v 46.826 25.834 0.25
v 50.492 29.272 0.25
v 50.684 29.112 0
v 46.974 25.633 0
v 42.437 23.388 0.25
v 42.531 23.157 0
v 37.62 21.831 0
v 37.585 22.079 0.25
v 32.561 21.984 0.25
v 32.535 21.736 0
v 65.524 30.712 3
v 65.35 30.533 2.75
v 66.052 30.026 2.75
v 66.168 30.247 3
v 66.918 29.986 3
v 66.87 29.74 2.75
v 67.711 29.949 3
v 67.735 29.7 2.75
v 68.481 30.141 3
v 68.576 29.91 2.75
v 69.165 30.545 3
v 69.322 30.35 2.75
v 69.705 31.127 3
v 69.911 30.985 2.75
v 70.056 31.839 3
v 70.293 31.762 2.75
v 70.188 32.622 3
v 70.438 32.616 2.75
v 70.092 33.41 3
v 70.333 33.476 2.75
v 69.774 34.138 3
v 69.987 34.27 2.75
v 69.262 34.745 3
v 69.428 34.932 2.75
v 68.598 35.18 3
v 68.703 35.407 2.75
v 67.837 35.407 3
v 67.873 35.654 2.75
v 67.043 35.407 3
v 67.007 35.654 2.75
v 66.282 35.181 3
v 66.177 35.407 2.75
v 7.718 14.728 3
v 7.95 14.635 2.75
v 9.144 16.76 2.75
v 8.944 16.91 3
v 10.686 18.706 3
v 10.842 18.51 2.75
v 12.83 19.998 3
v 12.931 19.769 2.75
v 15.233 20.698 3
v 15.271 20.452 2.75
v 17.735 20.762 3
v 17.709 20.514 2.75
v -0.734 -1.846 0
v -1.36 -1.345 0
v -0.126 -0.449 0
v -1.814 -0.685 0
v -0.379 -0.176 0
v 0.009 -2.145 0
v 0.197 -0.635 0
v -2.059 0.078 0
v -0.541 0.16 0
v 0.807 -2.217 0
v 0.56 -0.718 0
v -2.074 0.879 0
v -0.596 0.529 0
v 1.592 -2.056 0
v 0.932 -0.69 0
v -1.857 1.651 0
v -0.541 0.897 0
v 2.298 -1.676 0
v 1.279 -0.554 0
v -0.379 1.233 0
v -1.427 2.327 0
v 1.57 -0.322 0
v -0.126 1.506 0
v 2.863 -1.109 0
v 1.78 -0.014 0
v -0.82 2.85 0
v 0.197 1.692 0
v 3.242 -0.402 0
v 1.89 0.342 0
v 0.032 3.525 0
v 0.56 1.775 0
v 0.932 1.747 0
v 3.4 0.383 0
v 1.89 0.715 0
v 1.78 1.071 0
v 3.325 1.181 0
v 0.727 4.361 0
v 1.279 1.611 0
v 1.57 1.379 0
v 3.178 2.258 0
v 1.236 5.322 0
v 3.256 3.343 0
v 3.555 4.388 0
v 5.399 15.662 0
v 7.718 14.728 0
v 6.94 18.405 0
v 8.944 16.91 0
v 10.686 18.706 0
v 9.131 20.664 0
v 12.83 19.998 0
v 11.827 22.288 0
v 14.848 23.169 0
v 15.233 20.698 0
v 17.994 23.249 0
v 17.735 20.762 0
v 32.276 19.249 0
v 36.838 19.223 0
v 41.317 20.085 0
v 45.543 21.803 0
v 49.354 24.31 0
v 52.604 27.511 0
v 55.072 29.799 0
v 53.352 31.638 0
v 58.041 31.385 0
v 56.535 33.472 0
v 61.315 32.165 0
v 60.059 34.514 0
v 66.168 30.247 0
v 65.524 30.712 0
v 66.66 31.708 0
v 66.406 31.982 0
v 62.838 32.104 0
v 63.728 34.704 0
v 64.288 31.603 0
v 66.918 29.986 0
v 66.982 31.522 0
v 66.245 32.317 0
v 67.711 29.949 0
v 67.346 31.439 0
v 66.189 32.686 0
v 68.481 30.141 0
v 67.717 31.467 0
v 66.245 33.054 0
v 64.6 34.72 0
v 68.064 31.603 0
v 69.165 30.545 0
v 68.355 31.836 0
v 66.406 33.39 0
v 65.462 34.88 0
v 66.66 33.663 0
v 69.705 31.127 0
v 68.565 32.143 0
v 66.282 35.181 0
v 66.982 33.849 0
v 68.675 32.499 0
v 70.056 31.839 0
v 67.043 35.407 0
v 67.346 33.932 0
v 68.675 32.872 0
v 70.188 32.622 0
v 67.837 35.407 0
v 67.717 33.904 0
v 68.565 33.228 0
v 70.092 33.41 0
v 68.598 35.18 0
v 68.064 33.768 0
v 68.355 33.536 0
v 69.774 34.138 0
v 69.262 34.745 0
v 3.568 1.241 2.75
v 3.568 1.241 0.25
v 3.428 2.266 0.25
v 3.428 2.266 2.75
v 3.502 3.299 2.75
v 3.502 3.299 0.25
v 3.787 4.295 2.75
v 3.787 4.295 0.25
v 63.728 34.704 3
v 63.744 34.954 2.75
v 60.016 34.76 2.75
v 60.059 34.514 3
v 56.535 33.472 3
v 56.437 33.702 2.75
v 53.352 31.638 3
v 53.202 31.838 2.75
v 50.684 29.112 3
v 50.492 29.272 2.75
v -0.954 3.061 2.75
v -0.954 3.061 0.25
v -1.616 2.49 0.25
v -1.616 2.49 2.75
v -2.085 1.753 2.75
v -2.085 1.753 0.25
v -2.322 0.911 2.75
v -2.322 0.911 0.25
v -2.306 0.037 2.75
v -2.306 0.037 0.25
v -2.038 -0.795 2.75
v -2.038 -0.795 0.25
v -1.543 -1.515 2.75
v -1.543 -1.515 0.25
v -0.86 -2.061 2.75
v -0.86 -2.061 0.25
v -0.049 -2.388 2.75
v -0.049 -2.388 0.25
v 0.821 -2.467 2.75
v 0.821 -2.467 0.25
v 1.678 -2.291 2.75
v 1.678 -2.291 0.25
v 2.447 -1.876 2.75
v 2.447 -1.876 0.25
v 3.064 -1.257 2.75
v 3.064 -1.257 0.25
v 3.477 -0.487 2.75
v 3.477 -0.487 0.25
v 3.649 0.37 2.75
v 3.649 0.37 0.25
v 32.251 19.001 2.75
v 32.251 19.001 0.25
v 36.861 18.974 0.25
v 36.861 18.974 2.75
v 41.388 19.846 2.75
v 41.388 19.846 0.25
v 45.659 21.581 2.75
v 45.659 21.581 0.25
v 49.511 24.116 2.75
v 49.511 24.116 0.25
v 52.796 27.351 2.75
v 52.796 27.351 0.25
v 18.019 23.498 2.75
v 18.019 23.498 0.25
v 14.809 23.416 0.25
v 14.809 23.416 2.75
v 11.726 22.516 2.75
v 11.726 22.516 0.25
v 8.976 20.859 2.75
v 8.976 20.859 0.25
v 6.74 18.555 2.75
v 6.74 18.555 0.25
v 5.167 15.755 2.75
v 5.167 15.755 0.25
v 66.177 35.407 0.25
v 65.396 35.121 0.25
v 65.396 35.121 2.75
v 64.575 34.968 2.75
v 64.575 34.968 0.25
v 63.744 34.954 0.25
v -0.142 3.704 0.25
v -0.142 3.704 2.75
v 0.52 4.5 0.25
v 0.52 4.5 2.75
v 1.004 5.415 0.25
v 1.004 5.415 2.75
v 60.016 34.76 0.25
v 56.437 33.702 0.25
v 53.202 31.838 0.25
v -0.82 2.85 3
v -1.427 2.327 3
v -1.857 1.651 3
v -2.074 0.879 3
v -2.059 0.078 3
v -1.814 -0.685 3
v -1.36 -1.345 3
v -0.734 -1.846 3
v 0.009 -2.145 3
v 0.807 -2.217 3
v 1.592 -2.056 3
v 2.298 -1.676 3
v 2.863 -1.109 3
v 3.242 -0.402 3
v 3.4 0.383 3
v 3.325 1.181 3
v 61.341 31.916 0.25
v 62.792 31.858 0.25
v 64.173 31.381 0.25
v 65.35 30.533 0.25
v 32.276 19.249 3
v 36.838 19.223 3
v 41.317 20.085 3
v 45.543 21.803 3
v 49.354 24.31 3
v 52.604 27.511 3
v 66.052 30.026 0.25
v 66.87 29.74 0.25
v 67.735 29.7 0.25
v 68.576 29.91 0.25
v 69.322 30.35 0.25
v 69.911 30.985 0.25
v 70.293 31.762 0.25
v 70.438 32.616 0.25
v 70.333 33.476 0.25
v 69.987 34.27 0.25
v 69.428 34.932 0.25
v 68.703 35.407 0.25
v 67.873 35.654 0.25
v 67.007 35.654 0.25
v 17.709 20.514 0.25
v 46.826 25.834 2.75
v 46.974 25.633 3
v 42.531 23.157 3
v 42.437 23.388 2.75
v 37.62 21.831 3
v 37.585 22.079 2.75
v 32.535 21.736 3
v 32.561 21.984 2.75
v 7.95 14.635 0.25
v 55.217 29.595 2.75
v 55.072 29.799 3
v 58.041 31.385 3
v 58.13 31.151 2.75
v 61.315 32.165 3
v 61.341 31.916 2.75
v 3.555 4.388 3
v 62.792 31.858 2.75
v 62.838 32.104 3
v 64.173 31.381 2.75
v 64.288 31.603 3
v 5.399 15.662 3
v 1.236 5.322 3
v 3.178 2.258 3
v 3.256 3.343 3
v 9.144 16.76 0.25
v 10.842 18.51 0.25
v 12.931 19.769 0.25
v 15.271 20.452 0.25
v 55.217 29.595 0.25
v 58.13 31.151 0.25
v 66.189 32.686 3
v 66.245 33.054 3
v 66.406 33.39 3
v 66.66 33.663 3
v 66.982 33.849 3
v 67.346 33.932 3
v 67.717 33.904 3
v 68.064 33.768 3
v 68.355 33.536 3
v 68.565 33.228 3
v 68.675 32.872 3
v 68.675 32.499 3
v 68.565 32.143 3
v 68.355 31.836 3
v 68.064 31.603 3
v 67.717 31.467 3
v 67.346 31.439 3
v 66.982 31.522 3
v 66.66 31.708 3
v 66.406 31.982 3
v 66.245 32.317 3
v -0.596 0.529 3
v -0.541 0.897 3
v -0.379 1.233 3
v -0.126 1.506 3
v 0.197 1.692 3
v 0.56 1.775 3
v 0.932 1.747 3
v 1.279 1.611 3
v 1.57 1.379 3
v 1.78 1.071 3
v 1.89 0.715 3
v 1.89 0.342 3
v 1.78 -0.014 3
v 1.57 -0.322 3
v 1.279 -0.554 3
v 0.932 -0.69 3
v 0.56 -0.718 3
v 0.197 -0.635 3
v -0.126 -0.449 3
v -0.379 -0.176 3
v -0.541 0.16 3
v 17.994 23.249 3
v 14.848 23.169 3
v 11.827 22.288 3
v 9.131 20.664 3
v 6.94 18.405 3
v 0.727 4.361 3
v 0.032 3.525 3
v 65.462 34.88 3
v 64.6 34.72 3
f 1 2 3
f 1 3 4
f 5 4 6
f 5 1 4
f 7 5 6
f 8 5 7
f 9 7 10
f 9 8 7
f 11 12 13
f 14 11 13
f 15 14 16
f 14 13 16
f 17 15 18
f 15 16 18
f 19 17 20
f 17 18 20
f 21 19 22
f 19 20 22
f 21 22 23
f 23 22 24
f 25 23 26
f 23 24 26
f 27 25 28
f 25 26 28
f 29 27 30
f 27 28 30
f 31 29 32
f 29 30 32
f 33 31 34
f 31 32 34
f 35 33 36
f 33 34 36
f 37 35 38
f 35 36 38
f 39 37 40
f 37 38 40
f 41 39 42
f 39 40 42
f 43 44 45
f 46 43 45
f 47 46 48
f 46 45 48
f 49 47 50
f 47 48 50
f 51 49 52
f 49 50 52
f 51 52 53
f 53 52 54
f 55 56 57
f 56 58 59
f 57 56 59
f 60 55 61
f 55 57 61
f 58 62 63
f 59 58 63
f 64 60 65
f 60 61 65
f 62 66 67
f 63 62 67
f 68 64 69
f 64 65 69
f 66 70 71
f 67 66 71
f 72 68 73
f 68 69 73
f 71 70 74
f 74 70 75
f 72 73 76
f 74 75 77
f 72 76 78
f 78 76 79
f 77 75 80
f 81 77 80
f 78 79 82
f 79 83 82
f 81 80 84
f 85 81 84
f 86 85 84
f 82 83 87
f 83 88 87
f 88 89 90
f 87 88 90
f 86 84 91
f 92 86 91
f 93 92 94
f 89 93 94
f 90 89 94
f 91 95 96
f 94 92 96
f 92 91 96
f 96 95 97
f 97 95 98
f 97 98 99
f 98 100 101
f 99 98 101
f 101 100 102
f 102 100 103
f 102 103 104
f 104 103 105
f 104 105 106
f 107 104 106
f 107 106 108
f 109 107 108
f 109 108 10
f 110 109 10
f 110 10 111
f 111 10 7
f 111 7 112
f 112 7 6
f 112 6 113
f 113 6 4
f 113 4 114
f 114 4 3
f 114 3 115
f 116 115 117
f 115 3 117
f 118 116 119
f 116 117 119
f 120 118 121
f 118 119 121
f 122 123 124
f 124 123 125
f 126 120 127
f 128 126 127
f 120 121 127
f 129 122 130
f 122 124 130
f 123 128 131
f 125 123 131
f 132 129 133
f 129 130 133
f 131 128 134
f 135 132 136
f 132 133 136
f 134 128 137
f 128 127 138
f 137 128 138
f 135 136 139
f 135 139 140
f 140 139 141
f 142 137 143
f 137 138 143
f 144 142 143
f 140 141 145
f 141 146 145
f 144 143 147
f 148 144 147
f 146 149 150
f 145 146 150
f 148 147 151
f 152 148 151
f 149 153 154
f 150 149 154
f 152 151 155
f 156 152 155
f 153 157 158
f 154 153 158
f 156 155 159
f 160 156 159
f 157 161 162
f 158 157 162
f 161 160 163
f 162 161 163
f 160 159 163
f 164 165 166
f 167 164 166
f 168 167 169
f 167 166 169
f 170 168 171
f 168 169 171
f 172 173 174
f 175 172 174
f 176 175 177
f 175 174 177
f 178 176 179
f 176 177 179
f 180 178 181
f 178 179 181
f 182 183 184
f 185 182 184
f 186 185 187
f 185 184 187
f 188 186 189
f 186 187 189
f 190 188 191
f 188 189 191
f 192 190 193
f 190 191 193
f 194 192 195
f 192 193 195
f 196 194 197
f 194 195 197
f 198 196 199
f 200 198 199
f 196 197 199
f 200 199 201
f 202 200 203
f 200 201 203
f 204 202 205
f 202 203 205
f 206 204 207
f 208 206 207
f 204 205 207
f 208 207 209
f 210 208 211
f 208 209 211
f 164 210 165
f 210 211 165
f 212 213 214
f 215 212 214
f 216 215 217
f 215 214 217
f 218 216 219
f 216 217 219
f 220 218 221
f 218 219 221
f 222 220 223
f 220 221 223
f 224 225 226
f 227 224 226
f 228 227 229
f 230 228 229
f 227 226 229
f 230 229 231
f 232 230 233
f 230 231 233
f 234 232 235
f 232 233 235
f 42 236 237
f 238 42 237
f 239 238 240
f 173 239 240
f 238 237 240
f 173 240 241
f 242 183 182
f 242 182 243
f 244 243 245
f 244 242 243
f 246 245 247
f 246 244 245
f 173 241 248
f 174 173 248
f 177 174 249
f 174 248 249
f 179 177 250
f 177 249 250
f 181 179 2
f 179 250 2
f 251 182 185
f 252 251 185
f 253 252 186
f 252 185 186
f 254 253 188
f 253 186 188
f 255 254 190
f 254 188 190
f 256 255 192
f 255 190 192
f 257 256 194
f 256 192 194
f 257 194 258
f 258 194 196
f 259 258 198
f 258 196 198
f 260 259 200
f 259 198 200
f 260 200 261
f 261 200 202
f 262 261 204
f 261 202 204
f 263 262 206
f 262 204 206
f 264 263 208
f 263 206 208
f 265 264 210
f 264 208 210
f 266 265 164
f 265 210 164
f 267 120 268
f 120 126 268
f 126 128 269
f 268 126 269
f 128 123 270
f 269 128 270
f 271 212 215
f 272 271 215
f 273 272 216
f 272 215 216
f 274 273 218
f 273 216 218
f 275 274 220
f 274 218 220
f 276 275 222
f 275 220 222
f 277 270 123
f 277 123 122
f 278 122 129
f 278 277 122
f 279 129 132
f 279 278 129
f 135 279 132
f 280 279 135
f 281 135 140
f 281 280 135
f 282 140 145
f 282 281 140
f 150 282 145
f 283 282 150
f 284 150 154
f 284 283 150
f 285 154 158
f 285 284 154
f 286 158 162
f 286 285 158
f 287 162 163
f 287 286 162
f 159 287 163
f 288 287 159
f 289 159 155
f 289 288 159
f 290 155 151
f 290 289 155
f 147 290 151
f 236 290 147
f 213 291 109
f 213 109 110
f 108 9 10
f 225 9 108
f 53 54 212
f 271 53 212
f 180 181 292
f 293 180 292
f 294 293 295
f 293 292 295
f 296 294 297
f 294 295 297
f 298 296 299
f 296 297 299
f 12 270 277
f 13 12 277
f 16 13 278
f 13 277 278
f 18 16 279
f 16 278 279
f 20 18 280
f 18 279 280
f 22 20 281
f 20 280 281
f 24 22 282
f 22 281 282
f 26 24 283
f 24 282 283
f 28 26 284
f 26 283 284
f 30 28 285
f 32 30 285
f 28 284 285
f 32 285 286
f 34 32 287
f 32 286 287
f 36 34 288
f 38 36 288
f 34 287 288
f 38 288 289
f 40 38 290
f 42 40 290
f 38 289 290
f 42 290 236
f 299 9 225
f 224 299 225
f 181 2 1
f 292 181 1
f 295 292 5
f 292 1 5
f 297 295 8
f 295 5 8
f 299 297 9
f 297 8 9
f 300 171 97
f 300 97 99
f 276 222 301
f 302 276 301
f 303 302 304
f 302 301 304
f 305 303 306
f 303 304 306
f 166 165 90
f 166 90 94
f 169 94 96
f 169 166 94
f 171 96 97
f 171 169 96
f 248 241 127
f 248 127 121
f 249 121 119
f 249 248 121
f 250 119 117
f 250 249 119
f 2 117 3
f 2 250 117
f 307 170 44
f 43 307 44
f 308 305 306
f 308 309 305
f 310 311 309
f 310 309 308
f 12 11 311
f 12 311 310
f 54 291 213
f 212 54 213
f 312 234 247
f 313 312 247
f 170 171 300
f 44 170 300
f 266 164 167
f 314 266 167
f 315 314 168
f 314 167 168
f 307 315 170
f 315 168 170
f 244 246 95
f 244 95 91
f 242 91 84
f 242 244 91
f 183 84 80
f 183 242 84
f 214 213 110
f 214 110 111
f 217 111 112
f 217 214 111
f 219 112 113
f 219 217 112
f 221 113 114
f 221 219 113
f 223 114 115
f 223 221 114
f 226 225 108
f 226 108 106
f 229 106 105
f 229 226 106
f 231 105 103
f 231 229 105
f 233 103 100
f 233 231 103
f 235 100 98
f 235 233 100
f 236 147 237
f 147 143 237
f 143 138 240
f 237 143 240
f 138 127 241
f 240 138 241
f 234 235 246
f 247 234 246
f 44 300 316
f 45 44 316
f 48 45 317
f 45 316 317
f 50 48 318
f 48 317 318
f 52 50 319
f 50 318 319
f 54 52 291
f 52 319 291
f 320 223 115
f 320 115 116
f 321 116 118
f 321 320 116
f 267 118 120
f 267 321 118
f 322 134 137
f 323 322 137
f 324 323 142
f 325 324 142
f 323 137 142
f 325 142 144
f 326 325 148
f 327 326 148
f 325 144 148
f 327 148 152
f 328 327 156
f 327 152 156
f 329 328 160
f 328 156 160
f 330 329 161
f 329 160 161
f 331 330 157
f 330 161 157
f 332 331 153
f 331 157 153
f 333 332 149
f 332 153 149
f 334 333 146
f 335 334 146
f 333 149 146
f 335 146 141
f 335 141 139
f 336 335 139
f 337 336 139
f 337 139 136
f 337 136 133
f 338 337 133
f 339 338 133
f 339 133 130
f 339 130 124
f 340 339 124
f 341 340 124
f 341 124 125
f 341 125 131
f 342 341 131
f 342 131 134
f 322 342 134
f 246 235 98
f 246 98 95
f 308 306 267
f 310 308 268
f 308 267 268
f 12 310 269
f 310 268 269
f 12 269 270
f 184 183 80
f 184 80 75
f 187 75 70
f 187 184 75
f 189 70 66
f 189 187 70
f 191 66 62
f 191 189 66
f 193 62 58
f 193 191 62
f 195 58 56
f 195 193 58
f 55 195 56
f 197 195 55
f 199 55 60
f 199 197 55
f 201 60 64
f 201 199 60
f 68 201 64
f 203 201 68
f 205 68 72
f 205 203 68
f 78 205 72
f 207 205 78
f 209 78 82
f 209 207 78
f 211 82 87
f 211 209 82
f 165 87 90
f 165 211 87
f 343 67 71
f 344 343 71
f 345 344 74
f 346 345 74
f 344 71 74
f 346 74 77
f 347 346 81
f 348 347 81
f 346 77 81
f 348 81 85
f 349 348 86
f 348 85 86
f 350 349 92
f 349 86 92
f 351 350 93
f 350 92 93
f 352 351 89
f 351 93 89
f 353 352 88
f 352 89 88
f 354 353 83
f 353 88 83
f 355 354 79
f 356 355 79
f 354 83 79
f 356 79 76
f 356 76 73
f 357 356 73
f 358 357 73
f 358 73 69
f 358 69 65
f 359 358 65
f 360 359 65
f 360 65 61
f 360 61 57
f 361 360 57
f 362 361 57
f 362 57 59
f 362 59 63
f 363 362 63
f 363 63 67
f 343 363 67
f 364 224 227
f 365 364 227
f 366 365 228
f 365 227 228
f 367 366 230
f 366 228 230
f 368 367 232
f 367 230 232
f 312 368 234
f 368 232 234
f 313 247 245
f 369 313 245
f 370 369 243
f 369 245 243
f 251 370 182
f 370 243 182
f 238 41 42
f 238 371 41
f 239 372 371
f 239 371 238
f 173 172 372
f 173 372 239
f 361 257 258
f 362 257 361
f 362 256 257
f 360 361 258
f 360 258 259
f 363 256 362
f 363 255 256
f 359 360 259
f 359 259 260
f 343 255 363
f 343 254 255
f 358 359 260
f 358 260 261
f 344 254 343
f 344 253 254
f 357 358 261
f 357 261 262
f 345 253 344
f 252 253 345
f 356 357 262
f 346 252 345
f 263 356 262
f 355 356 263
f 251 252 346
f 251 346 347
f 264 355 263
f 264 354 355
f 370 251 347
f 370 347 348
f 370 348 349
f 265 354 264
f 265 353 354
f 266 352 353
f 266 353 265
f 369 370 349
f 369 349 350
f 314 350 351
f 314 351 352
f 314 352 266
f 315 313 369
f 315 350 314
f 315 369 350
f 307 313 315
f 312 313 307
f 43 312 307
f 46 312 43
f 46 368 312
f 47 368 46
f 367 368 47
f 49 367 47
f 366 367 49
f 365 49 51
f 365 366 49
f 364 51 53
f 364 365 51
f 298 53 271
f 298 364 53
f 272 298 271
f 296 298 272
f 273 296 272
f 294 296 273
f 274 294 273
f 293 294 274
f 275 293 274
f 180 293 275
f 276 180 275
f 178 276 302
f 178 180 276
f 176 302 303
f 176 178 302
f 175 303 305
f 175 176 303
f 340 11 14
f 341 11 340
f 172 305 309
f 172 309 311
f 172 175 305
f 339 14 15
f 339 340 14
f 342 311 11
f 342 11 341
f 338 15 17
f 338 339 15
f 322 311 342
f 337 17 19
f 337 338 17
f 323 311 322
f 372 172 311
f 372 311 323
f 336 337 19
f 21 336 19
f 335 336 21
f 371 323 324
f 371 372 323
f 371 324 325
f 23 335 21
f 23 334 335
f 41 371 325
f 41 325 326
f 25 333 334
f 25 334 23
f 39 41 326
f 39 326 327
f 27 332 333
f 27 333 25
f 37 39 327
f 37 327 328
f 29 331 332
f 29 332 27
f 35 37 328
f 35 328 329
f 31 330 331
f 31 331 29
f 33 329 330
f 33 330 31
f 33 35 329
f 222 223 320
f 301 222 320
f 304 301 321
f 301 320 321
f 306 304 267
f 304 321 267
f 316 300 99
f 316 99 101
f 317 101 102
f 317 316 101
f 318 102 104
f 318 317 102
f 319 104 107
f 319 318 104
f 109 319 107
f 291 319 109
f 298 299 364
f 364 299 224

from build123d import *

# Parameters (mm, degrees)
EXTRUDE_THIN1_DEPTH   = 3
SKETCH1_3_R           = 3
BOSS_EXTRUDE1_DEPTH   = 3
FILLET1_R             = 5
F_2_5MM_DOWEL_HOLE1_D = 2.5
CHAMFER1_SIZE         = 0.25


with BuildPart() as part:
    # Sketch1 → Extrude-Thin1 (new body)
    with BuildSketch(Plane.XY):
        with BuildLine():
            ThreePointArc((67.932775445, 34.102173105), (58.457726976, 34.411419672), (50.491619232, 29.272032126))
            ThreePointArc((50.491619232, 29.272032126), (42.436789288, 23.388051771), (32.560988498, 21.984460302))
            Line((32.560988498, 21.984460302), (18.0194176, 23.497567077))
            ThreePointArc((18.0194176, 23.497567077), (10.297542455, 21.776854665), (5.1667157, 15.754992513))
            Line((5.1667157, 15.754992513), (-0.737799909, 1.088733357))
            Line((-0.737799909, 1.088733357), (2.04513605, -0.031653828))
            Line((2.04513605, -0.031653828), (7.949651659, 14.634605328))
            ThreePointArc((7.949651659, 14.634605328), (11.845577871, 19.207110251), (17.7089323, 20.513677186))
            Line((17.7089323, 20.513677186), (32.250503198, 19.000570412))
            ThreePointArc((32.250503198, 19.000570412), (43.566353212, 20.608827896), (52.795705795, 27.350786407))
            ThreePointArc((52.795705795, 27.350786407), (59.258407694, 31.520241644), (66.94527507, 31.269357719))
            Line((66.94527507, 31.269357719), (67.932775445, 34.102173105))
        make_face()
    extrude(amount=EXTRUDE_THIN1_DEPTH)

    # Sketch1<3> → Boss-Extrude1 (add, through all)
    with BuildSketch(Plane.XY):
        with Locations((0.653668071, 0.528539764)):
            Circle(SKETCH1_3_R)
        with Locations((67.439025258, 32.685765412)):
            Circle(SKETCH1_3_R)
    extrude(amount=BOSS_EXTRUDE1_DEPTH)

    # Fillet1
    fillet1_edges = [part.edges().sort_by_distance(p)[0] for p in [
        (0.232483855, 3.498826595, 1.5),
        (3.015419815, 2.37843941, 1.5),
        (64.556717413, 31.853718847, 1.5),
        (65.287195047, 34.77613063, 1.5),
    ]]
    fillet(fillet1_edges, radius=FILLET1_R)

    # Ø2.5mm Dowel Hole1 (through all)
    with Locations(Plane.XY.offset(3)):
        with Locations((67.439025258, 32.685765412), (0.653668071, 0.528539764)):
            Hole(F_2_5MM_DOWEL_HOLE1_D / 2)

    # Chamfer1
    chamfer1_edges = [part.edges().sort_by_distance(p)[0] for p in [
        (10.297542455, 21.776854665, 0),
        (25.290203049, 22.741013689, 0),
        (42.436789288, 23.388051771, 0),
        (43.566353212, 20.608827896, 0),
        (24.979717749, 19.757123799, 0),
        (5.868250185, 9.464600631, 3),
        (11.845577871, 19.207110251, 0),
        (5.868250185, 9.464600631, 0),
        (3.085314225, 10.584987816, 0),
        (11.845577871, 19.207110251, 3),
        (24.979717749, 19.757123799, 3),
        (43.566353212, 20.608827896, 3),
        (42.436789288, 23.388051771, 3),
        (25.290203049, 22.741013689, 3),
        (10.297542455, 21.776854665, 3),
        (3.085314225, 10.584987816, 3),
        (56.623528898, 30.466570313, 0),
        (56.623528898, 30.466570313, 3),
        (70.396803241, 32.184218401, 0),
        (70.396803241, 32.184218401, 3),
        (56.436616897, 33.701943285, 0),
        (56.436616897, 33.701943285, 3),
        (-0.466719115, -2.254396195, 3),
        (-0.466719115, -2.254396195, 0),
        (63.499669001, 31.670454016, 3),
        (63.499669001, 31.670454016, 0),
        (64.988861472, 35.027622491, 3),
        (64.988861472, 35.027622491, 0),
        (3.437869945, 2.784750939, 0),
        (3.437869945, 2.784750939, 3),
        (0.209401135, 4.084505995, 0),
        (0.209401135, 4.084505995, 3),
    ]]
    chamfer(chamfer1_edges, length=CHAMFER1_SIZE - 0.0001)  # a hair under: the kernel refuses the full size


solid = part.part
